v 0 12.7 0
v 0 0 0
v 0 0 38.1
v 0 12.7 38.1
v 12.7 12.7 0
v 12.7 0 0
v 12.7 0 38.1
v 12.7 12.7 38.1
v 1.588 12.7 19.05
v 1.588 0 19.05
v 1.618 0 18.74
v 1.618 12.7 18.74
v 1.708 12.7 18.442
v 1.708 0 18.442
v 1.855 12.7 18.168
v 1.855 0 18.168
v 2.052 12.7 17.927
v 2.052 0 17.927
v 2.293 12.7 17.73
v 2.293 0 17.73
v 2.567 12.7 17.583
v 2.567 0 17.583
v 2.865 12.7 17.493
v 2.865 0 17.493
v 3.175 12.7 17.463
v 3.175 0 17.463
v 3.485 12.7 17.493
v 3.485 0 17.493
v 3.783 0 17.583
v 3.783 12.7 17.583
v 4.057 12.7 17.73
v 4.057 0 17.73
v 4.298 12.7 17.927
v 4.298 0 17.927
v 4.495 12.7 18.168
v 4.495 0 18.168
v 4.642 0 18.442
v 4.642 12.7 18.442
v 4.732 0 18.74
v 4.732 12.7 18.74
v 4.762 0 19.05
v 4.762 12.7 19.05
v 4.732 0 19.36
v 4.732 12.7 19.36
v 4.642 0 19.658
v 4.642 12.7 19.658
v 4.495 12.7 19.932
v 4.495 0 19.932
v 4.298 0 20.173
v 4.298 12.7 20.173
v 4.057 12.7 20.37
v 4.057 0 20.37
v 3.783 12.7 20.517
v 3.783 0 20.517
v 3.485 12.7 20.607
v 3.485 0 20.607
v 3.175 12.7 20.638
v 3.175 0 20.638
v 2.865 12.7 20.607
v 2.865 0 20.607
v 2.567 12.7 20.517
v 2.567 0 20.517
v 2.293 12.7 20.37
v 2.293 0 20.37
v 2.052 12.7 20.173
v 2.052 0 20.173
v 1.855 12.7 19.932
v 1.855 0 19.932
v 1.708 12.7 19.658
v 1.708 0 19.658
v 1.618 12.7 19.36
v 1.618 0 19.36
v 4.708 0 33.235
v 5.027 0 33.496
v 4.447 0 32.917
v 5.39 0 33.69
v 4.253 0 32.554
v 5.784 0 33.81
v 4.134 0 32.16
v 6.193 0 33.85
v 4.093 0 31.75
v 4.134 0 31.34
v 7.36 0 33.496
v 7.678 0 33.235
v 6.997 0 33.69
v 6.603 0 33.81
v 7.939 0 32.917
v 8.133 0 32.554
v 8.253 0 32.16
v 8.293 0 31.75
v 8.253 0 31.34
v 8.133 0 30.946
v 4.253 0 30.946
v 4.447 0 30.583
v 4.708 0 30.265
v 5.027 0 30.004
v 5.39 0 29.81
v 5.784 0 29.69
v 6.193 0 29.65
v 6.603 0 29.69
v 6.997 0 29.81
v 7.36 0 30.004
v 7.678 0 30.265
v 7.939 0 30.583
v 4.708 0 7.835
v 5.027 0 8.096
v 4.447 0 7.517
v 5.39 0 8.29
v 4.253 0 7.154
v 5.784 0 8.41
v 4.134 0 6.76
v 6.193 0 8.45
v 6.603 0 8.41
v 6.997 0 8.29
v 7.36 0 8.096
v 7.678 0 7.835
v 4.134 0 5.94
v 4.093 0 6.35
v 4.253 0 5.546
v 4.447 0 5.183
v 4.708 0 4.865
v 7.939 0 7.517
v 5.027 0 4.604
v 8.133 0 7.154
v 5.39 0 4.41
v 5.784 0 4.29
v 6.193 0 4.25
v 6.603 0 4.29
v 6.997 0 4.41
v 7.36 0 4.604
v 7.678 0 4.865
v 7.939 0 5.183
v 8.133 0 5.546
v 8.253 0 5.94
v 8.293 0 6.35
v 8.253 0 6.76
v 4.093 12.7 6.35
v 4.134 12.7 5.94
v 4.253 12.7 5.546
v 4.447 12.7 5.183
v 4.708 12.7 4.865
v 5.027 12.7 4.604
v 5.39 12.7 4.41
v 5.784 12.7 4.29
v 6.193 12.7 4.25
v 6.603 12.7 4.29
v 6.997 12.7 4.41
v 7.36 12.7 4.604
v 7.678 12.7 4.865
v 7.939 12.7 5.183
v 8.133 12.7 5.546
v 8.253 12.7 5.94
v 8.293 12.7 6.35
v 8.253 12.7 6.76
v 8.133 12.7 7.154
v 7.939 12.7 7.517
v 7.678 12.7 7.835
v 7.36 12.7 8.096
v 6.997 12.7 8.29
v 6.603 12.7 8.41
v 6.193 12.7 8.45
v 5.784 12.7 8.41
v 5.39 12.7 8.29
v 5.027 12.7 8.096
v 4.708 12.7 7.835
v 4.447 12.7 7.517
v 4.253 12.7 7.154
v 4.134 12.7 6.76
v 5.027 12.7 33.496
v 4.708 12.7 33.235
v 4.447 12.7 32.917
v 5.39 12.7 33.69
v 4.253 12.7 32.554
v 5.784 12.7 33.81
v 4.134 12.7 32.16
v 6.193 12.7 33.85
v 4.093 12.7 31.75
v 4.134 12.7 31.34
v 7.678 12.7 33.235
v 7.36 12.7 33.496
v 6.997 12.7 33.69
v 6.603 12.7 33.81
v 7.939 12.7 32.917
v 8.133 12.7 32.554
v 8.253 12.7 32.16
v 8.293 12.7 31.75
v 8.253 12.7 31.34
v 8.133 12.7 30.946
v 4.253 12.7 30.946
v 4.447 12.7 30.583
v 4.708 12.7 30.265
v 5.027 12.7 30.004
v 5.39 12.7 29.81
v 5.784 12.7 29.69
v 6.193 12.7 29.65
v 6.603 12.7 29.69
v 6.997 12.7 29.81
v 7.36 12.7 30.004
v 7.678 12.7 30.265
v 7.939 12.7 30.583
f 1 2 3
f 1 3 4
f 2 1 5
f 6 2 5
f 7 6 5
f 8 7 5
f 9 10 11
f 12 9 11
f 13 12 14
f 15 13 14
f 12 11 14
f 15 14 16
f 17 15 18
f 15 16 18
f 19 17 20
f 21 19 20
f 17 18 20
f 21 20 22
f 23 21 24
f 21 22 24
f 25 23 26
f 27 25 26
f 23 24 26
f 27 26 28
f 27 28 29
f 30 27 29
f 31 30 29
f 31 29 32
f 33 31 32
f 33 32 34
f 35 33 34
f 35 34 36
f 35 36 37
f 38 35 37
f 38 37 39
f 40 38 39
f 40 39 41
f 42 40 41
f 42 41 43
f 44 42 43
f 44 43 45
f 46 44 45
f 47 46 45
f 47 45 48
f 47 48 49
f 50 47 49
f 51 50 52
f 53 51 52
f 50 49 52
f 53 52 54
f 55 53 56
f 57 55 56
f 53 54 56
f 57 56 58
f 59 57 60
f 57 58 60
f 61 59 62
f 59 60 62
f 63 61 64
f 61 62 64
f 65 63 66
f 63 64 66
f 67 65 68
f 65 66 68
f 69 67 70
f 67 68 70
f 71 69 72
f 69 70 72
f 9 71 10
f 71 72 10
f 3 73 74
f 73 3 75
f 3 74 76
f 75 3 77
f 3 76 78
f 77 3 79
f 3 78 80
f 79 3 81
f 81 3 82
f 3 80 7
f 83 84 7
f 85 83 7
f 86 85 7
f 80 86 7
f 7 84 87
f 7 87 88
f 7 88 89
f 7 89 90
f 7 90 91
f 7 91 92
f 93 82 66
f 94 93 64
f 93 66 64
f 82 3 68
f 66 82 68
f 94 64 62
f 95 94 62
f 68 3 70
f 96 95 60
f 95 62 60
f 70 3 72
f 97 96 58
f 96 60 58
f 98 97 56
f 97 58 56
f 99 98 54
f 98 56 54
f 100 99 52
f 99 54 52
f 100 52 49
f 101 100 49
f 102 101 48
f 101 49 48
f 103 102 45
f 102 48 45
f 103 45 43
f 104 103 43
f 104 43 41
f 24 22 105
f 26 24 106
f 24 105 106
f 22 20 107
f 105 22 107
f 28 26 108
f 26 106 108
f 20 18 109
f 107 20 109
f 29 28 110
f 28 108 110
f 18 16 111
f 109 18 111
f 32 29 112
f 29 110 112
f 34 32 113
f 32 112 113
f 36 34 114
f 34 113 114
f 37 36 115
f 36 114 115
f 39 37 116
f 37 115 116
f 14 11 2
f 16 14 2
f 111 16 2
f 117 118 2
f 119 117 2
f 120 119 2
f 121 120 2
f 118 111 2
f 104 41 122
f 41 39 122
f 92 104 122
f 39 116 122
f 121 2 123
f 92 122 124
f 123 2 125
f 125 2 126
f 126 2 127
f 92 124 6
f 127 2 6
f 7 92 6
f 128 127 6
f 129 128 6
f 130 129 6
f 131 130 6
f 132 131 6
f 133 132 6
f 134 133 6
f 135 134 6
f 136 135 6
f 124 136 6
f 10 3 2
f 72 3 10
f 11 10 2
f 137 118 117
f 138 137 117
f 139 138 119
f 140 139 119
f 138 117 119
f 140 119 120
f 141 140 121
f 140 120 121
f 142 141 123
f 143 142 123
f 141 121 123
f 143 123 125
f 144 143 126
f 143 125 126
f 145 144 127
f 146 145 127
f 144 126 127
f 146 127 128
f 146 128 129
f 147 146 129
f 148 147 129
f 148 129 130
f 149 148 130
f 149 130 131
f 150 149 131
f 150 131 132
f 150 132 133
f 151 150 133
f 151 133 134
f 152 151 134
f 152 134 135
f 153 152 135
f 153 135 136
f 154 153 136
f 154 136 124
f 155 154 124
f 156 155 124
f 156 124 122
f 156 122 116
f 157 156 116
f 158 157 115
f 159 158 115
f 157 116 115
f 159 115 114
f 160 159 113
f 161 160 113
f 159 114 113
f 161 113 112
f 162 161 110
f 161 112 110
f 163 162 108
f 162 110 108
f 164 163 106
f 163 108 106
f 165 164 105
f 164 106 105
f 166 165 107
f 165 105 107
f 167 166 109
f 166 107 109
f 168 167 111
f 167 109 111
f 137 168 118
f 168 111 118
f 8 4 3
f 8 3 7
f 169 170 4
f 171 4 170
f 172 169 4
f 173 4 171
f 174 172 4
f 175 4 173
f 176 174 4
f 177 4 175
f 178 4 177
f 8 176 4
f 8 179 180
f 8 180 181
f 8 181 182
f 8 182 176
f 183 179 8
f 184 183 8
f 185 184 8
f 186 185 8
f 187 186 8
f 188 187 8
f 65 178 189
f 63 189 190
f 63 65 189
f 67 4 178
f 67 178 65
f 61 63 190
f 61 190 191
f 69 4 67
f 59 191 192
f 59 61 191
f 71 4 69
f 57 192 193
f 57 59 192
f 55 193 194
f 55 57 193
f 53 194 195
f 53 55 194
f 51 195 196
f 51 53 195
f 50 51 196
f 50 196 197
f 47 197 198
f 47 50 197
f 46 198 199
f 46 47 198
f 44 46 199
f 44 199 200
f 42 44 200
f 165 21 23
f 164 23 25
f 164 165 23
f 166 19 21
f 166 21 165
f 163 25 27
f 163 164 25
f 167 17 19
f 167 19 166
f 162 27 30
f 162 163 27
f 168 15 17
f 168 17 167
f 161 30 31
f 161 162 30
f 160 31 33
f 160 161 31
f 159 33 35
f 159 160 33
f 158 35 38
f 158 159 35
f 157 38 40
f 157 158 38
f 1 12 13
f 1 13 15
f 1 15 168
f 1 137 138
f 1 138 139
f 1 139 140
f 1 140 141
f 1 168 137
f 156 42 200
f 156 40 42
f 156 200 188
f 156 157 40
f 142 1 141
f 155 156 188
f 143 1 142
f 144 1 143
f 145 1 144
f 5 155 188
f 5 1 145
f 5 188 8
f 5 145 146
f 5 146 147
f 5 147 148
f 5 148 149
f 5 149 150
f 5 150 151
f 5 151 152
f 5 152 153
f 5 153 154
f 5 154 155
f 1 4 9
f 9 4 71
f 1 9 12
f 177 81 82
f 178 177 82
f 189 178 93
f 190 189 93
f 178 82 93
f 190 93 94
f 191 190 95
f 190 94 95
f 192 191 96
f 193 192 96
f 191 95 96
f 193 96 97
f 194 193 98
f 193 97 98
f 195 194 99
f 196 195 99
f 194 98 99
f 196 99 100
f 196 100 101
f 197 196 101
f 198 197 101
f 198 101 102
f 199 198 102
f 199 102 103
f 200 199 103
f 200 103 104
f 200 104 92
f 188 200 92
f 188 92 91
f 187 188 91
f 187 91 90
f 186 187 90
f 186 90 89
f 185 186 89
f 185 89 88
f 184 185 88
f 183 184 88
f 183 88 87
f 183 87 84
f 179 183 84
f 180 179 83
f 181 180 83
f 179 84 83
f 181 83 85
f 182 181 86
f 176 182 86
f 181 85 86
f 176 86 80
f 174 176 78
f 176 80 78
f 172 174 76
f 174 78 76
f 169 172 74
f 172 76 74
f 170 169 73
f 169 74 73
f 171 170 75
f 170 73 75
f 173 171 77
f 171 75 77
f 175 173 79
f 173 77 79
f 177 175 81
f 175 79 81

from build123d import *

# Parameters (mm, degrees)
SKETCH1_W                    = 12.7
SKETCH1_H                    = 12.7
BOSS_EXTRUDE1_DEPTH          = 38.1
TAP_DRILL_FOR_M5X0_8_TAP1_D  = 4.2
F_1_8_0_125_DIAMETER_HOLE1_D = 3.175


with BuildPart() as part:
    # Sketch1 → Boss-Extrude1 (new body)
    with BuildSketch(Plane.XY):
        with Locations((6.35, 6.35)):
            Rectangle(SKETCH1_W, SKETCH1_H)
    extrude(amount=BOSS_EXTRUDE1_DEPTH)

    # Tap Drill for M5x0.8 Tap1 (through all)
    with Locations(Plane(origin=(0, 12.7, 0), x_dir=(1, 0, 0), z_dir=(0, 1, 0))):
        with Locations((6.193295447, -6.35), (6.193295447, -31.75)):
            Hole(TAP_DRILL_FOR_M5X0_8_TAP1_D / 2)

    # 1/8 (0.125) Diameter Hole1 (through all)
    with Locations(Plane(origin=(0, 12.7, 0), x_dir=(1, 0, 0), z_dir=(0, 1, 0))):
        with Locations((3.175, -19.05)):
            Hole(F_1_8_0_125_DIAMETER_HOLE1_D / 2)


solid = part.part
